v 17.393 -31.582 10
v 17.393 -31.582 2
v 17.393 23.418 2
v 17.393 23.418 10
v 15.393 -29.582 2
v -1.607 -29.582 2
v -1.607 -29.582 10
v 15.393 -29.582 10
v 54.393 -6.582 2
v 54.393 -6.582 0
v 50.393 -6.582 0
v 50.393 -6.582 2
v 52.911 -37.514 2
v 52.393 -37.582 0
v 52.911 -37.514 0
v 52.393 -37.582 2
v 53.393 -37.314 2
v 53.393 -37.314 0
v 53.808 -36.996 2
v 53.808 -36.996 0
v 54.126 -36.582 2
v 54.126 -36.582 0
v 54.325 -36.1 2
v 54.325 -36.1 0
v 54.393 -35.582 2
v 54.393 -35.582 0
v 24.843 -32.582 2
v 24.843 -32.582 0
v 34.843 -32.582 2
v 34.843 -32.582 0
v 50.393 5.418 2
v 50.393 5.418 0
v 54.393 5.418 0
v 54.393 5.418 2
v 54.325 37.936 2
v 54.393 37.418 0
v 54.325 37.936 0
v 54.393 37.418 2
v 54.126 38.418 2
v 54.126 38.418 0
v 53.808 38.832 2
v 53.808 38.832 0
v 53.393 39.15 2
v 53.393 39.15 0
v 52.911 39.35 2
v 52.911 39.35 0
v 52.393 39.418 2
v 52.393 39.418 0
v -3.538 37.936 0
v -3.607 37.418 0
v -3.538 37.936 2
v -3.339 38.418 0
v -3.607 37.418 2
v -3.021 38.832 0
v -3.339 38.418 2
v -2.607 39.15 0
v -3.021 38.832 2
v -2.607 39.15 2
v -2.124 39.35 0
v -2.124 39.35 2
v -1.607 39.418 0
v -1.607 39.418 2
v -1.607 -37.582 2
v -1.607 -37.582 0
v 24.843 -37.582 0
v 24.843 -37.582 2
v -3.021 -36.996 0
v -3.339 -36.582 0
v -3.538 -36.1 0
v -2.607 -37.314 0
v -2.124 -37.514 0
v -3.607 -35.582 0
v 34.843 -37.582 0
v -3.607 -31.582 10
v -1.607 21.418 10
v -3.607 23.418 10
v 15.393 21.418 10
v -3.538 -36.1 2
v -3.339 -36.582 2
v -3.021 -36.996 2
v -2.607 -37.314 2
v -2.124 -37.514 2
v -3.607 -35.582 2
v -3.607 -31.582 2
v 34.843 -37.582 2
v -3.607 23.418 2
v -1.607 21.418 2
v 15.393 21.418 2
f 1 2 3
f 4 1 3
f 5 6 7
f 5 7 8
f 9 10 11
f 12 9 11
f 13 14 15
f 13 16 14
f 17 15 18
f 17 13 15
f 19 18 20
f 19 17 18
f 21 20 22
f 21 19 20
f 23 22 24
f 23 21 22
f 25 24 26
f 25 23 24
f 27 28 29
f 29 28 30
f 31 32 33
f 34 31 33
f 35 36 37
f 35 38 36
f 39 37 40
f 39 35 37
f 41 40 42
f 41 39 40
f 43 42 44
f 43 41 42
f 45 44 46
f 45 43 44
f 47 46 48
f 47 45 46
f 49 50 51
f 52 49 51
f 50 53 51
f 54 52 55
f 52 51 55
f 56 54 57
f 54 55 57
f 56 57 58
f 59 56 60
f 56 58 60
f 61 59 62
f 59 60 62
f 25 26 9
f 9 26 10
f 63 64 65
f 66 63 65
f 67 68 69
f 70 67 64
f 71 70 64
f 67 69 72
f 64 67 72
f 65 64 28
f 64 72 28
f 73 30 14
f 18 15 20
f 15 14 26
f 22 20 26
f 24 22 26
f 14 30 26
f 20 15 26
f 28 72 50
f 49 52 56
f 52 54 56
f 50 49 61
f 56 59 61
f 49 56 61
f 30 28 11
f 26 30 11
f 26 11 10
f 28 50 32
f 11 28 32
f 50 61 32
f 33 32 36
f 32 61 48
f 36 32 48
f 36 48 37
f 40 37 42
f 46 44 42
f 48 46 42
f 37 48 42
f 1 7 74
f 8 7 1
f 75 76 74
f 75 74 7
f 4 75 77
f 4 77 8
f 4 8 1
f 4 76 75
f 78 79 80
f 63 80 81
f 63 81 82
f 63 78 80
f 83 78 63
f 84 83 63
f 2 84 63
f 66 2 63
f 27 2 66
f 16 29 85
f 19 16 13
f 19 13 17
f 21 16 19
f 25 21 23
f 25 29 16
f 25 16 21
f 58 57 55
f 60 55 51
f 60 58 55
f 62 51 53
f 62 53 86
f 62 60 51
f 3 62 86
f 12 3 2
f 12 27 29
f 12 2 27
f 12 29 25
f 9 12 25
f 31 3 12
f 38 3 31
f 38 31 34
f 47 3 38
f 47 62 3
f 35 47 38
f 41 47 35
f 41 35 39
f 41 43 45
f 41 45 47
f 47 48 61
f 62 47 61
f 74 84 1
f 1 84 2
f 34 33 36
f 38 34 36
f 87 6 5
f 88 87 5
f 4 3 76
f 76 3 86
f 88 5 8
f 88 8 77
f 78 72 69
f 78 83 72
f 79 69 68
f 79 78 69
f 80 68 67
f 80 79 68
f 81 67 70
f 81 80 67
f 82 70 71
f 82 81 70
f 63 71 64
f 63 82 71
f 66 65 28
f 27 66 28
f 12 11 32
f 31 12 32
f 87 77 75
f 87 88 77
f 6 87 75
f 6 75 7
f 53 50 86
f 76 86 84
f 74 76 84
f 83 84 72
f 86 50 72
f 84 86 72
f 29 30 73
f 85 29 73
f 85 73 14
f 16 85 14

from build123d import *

# Parameters (mm, degrees)
F1_DEPTH = 2
F2_DEPTH = 10
F3_T     = -2
F4_R     = 2


with BuildPart() as f1:
    # F0 (on Top) → F1 (new body)
    with BuildSketch(Plane.XY):
        Polygon((18.3934628367, 39.4180682003), (-3.6065371633, 39.4180682003), (-3.6065371633, 23.4180682003), (17.3934628367, 23.4180682003), (17.3934628367, -31.5819317997), (-3.6065371633, -31.5819317997), (-3.6065371633, -37.5819317997), (24.8428341001, -37.5819317997), (24.8428341001, -32.5819317997), (34.8428341001, -32.5819317997), (34.8428341001, -37.5819317997), (54.3934628367, -37.5819317997), (54.3934628367, -6.5819317997), (50.3934628367, -6.5819317997), (50.3934628367, 5.4180682003), (54.3934628367, 5.4180682003), (54.3934628367, 17.4180682003), (54.3934628367, 39.4180682003), (32.3934628367, 39.4180682003), align=None)
        Polygon((17.3934628367, 23.4180682003), (-3.6065371633, 23.4180682003), (-3.6065371633, 17.4180682003), (-3.6065371633, -31.5819317997), (17.3934628367, -31.5819317997), align=None)
    extrude(amount=F1_DEPTH)

    # F0 (on Top) → F2 (join)
    with BuildSketch(Plane.XY):
        Polygon((17.3934628367, 23.4180682003), (-3.6065371633, 23.4180682003), (-3.6065371633, 17.4180682003), (-3.6065371633, -31.5819317997), (17.3934628367, -31.5819317997), align=None)
    extrude(amount=F2_DEPTH)

    # F3
    f3_openings = [f1.faces().sort_by_distance(p)[0] for p in [
        (6.893463, -4.081932, 10),
    ]]
    offset(amount=F3_T, openings=f3_openings, kind=Kind.INTERSECTION)

    # F4
    f4_edges = [f1.edges().sort_by_distance(p)[0] for p in [
        (54.393463, 39.418068, 1),
        (-3.606537, 39.418068, 1),
        (54.393463, -37.581932, 1),
        (-3.606537, -37.581932, 1),
    ]]
    fillet(f4_edges, radius=F4_R)


solid = f1.part
